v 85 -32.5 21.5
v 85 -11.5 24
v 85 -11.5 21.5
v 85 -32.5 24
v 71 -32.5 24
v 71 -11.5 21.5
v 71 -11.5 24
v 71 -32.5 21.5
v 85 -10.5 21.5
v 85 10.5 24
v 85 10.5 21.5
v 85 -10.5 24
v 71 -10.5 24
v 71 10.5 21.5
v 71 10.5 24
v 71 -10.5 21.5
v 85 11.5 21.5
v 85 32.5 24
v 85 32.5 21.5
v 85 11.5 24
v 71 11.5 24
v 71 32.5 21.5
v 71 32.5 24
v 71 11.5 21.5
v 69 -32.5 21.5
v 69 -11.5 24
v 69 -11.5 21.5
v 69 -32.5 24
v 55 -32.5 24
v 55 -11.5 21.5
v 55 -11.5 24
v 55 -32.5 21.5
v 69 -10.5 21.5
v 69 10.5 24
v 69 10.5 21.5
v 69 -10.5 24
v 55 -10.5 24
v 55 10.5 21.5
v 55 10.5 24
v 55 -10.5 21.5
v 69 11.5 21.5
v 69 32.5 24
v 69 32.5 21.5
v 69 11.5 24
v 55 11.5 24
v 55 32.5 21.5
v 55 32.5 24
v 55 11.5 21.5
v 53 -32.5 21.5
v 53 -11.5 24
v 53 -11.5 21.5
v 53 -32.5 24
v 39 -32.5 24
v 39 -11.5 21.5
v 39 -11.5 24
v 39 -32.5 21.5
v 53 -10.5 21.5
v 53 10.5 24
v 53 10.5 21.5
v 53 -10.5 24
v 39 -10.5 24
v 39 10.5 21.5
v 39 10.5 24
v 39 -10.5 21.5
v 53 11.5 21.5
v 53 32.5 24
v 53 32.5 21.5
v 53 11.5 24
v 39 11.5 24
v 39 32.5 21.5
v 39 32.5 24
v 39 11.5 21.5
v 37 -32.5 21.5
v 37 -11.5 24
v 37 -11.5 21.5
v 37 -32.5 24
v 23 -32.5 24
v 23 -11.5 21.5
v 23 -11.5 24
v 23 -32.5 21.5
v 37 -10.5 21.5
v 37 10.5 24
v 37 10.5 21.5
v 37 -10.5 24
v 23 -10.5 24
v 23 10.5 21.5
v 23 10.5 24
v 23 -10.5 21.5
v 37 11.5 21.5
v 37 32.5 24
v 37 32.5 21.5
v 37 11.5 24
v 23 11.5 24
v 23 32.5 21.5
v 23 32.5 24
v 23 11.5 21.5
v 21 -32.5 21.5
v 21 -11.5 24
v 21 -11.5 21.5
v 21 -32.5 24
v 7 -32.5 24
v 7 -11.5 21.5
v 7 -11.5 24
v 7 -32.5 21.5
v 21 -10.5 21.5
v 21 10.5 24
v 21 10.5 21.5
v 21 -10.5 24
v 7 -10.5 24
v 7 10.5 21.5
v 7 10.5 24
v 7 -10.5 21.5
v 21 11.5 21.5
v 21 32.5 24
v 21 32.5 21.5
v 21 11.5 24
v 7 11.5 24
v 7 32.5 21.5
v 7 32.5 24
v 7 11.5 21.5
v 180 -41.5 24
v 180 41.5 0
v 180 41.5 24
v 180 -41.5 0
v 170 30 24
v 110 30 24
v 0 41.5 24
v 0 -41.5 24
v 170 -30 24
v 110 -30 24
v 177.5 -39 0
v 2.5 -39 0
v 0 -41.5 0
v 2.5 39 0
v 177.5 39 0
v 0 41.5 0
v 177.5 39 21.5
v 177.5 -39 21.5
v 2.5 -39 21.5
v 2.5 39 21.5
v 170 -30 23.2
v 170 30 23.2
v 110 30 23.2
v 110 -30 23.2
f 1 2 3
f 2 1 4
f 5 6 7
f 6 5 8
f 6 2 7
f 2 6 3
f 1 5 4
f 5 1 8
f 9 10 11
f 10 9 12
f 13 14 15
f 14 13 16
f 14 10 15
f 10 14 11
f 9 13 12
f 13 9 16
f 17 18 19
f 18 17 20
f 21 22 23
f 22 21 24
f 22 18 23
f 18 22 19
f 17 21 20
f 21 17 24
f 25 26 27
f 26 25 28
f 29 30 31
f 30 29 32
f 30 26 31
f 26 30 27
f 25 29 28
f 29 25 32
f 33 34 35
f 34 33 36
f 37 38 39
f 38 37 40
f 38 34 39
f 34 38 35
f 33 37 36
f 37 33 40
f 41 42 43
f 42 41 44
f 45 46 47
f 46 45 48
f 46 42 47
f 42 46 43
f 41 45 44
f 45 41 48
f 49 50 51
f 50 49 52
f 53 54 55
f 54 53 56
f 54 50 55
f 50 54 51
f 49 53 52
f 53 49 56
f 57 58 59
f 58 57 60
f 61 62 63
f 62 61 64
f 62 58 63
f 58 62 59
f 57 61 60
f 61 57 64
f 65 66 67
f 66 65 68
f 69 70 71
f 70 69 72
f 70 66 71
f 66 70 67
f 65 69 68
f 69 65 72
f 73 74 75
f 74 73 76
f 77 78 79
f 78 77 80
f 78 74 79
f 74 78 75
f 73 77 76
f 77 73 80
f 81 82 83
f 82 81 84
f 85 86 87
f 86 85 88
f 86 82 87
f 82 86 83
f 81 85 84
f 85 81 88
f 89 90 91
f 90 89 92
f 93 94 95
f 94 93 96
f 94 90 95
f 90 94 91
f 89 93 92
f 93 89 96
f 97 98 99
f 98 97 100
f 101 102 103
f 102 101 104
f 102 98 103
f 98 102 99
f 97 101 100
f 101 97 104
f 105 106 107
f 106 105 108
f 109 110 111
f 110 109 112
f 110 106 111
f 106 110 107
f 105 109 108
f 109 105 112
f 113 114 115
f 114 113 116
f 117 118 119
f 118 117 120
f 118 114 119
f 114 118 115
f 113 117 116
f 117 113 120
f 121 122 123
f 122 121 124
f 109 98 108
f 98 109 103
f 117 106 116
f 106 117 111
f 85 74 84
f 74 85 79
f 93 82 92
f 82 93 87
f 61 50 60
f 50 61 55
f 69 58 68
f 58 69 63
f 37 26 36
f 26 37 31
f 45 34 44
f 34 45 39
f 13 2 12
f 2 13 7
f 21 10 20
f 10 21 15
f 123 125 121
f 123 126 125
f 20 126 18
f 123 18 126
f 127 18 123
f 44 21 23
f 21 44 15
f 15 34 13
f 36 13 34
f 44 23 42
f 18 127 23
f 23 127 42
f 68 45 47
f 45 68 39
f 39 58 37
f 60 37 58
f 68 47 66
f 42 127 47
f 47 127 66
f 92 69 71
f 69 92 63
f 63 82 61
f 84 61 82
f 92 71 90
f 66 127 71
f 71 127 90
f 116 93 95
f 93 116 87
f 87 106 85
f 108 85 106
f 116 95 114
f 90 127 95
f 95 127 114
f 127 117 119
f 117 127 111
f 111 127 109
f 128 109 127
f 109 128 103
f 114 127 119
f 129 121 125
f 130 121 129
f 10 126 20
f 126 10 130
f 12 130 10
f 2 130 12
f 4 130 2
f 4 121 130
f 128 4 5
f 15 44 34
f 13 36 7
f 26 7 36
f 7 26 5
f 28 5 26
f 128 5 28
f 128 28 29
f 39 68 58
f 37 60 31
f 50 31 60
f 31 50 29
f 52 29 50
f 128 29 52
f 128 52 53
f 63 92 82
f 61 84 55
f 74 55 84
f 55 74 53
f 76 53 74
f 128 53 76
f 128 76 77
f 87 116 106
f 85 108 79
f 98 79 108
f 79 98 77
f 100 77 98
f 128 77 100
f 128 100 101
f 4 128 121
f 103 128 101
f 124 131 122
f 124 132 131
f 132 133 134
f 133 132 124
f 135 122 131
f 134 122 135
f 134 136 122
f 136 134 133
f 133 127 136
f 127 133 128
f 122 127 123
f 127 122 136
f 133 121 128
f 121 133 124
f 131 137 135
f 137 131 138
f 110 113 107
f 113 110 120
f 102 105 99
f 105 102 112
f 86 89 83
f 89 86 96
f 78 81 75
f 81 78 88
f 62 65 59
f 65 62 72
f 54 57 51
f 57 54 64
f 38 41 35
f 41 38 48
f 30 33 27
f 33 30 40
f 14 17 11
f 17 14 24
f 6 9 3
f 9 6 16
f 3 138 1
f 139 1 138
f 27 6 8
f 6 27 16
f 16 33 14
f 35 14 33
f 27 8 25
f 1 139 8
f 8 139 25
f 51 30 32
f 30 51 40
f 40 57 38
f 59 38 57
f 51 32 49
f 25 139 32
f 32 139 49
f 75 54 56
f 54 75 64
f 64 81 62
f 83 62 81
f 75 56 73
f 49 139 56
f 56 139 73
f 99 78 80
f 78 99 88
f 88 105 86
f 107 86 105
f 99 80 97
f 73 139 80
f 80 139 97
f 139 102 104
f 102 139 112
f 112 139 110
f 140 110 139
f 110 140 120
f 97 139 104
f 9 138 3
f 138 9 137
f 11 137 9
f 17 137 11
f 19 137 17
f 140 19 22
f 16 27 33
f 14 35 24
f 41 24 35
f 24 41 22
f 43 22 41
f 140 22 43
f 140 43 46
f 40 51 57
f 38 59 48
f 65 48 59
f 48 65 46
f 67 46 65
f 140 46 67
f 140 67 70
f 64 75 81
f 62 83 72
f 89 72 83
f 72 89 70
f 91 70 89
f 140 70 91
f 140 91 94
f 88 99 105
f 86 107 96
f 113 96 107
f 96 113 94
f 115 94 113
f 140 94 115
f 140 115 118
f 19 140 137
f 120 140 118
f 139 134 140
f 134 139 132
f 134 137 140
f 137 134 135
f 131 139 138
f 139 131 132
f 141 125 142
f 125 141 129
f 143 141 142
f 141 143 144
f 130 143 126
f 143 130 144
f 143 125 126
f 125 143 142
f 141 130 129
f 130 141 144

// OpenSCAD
// The PIN pad for real trials: a case the size of an Ingenico Lane/3000 (180 x 83 x 24 mm) with a 3 x 5 keypad of
// Kailh Choc V1 Brown switches under printed 18 x 11 mm keycaps, at the same positions as in shielded_pin.py.
// Print in PLA or PETG, 0.2 mm layers. Render one part at a time: part = "case", "plate" or "cap".
part = "case";

L = 180; W = 83; H = 24;            // case, mm (x along the length, keypad at x = 0 end)
WALL = 2.5;
PLATE_T = 1.3;                      // Choc V1 plate thickness (1.2-1.3 mm)
CUT = 13.8;                         // Choc V1 plate cutout, square
ROW0 = 78; ROW_PITCH = 16;          // rows from the keypad end: 78, 62, 46, 30, 14 mm (shielded_pin.ROW_X)
COL_PITCH = 22;                     // columns at y = +22, 0, -22 mm from the centre line
CAP_W = 18; CAP_D = 11;             // keycap top, across (y) and along (x)
KEY_PROUD = 3.5;                    // a cap's top above the case top at rest
CLEAR = 1.5;                        // gap between a cap and the case opening

module key_positions() {
  for (r = [0:4]) for (c = [-1:1]) translate([ROW0 - ROW_PITCH * r, COL_PITCH * c, 0]) children();
}

// The shell: open at the bottom, an opening round each keycap in the top, a screen recess at the far end.
module case_shell() {
  difference() {
    translate([0, -W / 2, 0]) cube([L, W, H]);
    translate([WALL, -W / 2 + WALL, -1]) cube([L - 2 * WALL, W - 2 * WALL, H - WALL + 1]);
    key_positions() translate([-(CAP_D + 2 * CLEAR) / 2, -(CAP_W + 2 * CLEAR) / 2, H - WALL - 1])
      cube([CAP_D + 2 * CLEAR, CAP_W + 2 * CLEAR, WALL + 2]);
    translate([110, -30, H - 0.8]) cube([60, 60, 1]);   // screen recess (a dark sticker goes here)
  }
}

// The switch plate: glued under the top, at the depth that puts the cap tops KEY_PROUD above the case.
// PLATE_DROP is a starting value [not checked against Kailh's drawing]: after a test print, adjust it so the cap tops
// stand 3.5 mm above the case top at rest (KEY_PROUD), so that a cap never bottoms on the case.
PLATE_DROP = 6.0;
module plate() {
  difference() {
    translate([2, -(W - 2 * WALL - 1) / 2, 0]) cube([92, W - 2 * WALL - 1, PLATE_T]);
    key_positions() translate([-CUT / 2, -CUT / 2, -1]) cube([CUT, CUT, PLATE_T + 2]);
  }
}

// A keycap: 18 x 11 mm top, 6 mm tall, two Choc V1 stem sockets underneath (5.7 mm apart, 1.2 x 3.0 mm prongs).
// The digit and four 2 mm corner dots are recessed 0.4 mm into the top and filled with white paint: the dots are
// what the rater looks for in the onlooker's camera.
module cap(label = "5") {
  difference() {
    translate([-CAP_D / 2, -CAP_W / 2, 0]) cube([CAP_D, CAP_W, 6]);
    for (s = [-1, 1]) translate([-1.6, s * 5.7 / 2 - 0.65, -0.01]) cube([3.2, 1.3, 3.0]);   // stem sockets
    for (sx = [-1, 1]) for (sy = [-1, 1])
      translate([sx * (CAP_D / 2 - 1.5) - 1, sy * (CAP_W / 2 - 1.5) - 1, 5.6]) cube([2, 2, 1]);
    translate([0, 0, 5.6]) linear_extrude(1) rotate(-90) text(label, size = 5, halign = "center", valign = "center");
  }
}

if (part == "case") case_shell();
if (part == "plate") plate();
if (part == "cap") cap();
